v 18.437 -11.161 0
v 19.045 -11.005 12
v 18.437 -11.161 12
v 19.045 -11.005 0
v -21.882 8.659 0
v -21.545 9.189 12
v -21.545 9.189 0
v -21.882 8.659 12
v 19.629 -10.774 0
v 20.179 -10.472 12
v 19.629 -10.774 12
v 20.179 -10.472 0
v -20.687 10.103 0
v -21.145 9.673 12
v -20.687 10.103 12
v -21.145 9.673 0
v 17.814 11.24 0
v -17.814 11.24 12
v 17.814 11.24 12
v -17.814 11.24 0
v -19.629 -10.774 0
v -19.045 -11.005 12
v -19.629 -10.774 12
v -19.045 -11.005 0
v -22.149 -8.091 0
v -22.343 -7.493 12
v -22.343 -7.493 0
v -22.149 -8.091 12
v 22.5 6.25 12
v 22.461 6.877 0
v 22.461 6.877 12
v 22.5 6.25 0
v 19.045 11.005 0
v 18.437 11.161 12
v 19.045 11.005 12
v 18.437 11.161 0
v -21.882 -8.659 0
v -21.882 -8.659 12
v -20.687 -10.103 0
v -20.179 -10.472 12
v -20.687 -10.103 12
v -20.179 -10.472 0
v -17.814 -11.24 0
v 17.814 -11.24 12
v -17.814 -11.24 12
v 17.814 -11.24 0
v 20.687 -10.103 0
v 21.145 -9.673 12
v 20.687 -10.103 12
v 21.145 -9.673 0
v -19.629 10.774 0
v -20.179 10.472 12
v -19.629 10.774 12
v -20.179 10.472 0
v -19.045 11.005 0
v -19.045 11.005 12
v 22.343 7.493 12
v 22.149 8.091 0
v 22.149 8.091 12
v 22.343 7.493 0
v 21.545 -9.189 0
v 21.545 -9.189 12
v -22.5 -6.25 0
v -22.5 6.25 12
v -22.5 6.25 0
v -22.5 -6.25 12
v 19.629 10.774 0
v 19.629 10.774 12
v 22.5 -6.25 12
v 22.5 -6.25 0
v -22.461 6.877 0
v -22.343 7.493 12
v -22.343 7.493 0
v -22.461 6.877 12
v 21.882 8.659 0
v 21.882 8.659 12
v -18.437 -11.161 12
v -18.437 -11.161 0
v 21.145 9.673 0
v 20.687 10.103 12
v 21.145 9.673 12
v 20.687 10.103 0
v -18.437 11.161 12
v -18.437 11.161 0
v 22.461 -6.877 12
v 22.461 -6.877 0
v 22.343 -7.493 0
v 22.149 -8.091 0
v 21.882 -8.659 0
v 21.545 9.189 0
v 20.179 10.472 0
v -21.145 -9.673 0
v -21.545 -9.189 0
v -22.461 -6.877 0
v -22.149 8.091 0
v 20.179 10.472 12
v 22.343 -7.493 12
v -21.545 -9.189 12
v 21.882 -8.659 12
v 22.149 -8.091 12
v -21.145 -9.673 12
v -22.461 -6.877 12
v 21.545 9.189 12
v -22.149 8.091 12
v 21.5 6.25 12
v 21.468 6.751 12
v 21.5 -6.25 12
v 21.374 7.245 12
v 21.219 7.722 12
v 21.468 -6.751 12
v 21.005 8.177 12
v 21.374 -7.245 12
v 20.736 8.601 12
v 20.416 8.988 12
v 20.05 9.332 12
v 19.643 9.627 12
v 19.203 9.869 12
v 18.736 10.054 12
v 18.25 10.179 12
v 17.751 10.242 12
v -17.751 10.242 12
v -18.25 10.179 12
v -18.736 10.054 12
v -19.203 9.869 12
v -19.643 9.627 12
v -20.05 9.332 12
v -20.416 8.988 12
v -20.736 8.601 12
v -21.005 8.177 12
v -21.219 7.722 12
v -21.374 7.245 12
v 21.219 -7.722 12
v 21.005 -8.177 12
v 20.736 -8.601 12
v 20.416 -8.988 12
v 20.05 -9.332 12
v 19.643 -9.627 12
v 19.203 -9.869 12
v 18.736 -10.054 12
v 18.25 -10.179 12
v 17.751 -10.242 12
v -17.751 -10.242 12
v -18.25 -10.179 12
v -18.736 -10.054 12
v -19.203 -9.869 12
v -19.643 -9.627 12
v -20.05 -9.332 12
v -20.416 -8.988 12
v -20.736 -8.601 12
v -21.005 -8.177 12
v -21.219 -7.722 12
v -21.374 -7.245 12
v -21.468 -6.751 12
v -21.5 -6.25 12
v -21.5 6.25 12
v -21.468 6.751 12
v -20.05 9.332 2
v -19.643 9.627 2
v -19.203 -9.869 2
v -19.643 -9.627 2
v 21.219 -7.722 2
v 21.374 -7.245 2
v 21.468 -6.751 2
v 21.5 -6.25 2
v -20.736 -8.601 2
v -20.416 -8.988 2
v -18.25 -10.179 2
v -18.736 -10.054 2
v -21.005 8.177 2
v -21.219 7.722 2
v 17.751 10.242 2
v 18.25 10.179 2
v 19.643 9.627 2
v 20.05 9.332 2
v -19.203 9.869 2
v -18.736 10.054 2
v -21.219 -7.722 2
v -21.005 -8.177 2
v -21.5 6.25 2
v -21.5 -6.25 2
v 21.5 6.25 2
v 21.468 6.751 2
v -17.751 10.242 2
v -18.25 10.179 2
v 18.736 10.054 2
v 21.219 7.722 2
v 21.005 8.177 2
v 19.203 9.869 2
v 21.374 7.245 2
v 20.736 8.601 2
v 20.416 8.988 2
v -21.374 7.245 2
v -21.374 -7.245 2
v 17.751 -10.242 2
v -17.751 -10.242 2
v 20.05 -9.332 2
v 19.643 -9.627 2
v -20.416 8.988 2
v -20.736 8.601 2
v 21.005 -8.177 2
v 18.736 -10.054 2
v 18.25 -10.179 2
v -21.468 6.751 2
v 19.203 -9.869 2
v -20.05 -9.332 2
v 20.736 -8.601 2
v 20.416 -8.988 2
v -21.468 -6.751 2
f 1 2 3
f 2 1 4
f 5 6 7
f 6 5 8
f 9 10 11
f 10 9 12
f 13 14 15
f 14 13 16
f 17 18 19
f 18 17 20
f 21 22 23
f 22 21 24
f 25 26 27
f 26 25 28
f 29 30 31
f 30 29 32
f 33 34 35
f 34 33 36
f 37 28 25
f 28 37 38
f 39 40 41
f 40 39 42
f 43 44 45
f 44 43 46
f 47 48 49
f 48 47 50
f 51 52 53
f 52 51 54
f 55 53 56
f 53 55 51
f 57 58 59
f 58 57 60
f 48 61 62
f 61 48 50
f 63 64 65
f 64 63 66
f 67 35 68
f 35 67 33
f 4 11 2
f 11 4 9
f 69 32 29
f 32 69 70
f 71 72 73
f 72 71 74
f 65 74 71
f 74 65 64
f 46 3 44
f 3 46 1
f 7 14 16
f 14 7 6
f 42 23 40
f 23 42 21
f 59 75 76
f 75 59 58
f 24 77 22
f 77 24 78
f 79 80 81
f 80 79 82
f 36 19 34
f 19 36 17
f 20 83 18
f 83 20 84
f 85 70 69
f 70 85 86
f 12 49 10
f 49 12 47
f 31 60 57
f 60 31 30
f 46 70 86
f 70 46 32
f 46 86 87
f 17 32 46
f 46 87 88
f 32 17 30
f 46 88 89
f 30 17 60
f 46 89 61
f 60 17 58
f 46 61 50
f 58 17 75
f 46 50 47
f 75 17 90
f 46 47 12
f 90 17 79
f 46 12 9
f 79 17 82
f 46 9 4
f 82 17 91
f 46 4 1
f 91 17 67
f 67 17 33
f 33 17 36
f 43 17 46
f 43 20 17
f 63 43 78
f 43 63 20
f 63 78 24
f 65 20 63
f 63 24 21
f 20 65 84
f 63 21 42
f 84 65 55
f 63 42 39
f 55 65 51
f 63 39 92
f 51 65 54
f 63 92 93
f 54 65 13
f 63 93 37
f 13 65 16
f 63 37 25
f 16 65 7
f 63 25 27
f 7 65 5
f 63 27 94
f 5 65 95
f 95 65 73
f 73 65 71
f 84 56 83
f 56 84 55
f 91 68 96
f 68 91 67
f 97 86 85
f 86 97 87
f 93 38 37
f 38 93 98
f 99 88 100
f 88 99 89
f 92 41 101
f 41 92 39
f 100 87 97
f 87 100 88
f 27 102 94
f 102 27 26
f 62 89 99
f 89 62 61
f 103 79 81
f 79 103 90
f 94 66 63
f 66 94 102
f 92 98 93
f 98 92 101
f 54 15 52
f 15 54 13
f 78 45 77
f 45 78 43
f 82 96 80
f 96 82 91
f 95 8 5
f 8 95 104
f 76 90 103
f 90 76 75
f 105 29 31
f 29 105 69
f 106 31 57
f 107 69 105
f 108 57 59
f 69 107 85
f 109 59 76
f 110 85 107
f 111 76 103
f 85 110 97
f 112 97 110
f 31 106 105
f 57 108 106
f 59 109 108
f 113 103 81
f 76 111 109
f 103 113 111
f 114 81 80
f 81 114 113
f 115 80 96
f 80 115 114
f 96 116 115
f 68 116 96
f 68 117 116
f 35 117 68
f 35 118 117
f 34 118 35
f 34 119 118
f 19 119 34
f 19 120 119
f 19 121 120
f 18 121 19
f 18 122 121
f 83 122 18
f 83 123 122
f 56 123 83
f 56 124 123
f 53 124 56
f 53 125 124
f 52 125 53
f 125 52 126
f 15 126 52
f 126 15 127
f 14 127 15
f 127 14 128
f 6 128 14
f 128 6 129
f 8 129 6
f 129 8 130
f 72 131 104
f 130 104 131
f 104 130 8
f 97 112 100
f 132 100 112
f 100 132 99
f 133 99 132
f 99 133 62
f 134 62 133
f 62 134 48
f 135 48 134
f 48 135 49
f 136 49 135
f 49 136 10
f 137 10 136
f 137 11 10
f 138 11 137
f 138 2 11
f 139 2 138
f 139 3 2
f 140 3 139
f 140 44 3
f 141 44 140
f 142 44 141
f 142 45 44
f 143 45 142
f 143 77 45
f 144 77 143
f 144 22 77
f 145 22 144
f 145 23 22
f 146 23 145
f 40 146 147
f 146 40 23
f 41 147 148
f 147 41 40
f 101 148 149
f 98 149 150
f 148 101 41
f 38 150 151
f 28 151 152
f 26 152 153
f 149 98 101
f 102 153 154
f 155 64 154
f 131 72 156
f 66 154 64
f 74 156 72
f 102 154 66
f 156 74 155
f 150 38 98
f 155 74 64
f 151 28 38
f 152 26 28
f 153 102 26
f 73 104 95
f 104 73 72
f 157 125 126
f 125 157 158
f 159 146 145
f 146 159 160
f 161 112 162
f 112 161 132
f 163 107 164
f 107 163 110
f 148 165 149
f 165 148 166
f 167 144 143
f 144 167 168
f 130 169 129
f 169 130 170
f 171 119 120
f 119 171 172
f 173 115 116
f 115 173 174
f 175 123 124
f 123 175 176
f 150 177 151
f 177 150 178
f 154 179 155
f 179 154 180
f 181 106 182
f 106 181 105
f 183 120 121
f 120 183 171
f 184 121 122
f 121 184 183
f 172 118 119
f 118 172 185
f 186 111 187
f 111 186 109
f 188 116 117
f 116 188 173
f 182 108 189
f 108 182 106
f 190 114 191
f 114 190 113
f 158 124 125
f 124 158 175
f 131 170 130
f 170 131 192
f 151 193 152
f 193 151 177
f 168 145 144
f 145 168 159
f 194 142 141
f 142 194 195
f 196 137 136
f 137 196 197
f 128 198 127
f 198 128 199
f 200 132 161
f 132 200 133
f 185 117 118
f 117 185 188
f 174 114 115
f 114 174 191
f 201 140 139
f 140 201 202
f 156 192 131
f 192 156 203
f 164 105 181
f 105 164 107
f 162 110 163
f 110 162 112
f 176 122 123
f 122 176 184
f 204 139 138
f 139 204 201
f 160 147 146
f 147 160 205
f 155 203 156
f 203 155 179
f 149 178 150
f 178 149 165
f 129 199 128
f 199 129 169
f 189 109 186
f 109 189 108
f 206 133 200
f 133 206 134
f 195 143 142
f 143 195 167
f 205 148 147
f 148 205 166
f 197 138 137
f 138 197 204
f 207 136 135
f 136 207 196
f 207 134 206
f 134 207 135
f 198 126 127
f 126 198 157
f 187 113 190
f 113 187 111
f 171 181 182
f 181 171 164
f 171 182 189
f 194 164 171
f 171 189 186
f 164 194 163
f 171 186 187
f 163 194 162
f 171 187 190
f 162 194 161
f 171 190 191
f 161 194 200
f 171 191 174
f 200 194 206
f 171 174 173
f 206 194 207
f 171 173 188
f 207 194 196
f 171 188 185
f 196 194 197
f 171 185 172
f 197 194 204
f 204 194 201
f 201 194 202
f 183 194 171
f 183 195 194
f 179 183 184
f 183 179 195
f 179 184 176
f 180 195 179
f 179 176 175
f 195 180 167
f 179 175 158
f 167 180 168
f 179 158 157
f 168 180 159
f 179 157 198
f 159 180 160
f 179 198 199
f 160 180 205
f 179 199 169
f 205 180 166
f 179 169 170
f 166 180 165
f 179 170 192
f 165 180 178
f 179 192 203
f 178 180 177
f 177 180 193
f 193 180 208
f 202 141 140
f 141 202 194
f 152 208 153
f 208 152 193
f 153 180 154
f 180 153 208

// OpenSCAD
$fn = 50;


difference() {
	union() {
		hull() {
			translate(v = [-17.5000000000, 6.2500000000, 0]) {
				cylinder(h = 12, r = 5);
			}
			translate(v = [17.5000000000, 6.2500000000, 0]) {
				cylinder(h = 12, r = 5);
			}
			translate(v = [-17.5000000000, -6.2500000000, 0]) {
				cylinder(h = 12, r = 5);
			}
			translate(v = [17.5000000000, -6.2500000000, 0]) {
				cylinder(h = 12, r = 5);
			}
		}
	}
	union() {
		translate(v = [0, 0, 2]) {
			hull() {
				translate(v = [-17.5000000000, 6.2500000000, 0]) {
					cylinder(h = 10, r = 4);
				}
				translate(v = [17.5000000000, 6.2500000000, 0]) {
					cylinder(h = 10, r = 4);
				}
				translate(v = [-17.5000000000, -6.2500000000, 0]) {
					cylinder(h = 10, r = 4);
				}
				translate(v = [17.5000000000, -6.2500000000, 0]) {
					cylinder(h = 10, r = 4);
				}
			}
		}
	}
}
